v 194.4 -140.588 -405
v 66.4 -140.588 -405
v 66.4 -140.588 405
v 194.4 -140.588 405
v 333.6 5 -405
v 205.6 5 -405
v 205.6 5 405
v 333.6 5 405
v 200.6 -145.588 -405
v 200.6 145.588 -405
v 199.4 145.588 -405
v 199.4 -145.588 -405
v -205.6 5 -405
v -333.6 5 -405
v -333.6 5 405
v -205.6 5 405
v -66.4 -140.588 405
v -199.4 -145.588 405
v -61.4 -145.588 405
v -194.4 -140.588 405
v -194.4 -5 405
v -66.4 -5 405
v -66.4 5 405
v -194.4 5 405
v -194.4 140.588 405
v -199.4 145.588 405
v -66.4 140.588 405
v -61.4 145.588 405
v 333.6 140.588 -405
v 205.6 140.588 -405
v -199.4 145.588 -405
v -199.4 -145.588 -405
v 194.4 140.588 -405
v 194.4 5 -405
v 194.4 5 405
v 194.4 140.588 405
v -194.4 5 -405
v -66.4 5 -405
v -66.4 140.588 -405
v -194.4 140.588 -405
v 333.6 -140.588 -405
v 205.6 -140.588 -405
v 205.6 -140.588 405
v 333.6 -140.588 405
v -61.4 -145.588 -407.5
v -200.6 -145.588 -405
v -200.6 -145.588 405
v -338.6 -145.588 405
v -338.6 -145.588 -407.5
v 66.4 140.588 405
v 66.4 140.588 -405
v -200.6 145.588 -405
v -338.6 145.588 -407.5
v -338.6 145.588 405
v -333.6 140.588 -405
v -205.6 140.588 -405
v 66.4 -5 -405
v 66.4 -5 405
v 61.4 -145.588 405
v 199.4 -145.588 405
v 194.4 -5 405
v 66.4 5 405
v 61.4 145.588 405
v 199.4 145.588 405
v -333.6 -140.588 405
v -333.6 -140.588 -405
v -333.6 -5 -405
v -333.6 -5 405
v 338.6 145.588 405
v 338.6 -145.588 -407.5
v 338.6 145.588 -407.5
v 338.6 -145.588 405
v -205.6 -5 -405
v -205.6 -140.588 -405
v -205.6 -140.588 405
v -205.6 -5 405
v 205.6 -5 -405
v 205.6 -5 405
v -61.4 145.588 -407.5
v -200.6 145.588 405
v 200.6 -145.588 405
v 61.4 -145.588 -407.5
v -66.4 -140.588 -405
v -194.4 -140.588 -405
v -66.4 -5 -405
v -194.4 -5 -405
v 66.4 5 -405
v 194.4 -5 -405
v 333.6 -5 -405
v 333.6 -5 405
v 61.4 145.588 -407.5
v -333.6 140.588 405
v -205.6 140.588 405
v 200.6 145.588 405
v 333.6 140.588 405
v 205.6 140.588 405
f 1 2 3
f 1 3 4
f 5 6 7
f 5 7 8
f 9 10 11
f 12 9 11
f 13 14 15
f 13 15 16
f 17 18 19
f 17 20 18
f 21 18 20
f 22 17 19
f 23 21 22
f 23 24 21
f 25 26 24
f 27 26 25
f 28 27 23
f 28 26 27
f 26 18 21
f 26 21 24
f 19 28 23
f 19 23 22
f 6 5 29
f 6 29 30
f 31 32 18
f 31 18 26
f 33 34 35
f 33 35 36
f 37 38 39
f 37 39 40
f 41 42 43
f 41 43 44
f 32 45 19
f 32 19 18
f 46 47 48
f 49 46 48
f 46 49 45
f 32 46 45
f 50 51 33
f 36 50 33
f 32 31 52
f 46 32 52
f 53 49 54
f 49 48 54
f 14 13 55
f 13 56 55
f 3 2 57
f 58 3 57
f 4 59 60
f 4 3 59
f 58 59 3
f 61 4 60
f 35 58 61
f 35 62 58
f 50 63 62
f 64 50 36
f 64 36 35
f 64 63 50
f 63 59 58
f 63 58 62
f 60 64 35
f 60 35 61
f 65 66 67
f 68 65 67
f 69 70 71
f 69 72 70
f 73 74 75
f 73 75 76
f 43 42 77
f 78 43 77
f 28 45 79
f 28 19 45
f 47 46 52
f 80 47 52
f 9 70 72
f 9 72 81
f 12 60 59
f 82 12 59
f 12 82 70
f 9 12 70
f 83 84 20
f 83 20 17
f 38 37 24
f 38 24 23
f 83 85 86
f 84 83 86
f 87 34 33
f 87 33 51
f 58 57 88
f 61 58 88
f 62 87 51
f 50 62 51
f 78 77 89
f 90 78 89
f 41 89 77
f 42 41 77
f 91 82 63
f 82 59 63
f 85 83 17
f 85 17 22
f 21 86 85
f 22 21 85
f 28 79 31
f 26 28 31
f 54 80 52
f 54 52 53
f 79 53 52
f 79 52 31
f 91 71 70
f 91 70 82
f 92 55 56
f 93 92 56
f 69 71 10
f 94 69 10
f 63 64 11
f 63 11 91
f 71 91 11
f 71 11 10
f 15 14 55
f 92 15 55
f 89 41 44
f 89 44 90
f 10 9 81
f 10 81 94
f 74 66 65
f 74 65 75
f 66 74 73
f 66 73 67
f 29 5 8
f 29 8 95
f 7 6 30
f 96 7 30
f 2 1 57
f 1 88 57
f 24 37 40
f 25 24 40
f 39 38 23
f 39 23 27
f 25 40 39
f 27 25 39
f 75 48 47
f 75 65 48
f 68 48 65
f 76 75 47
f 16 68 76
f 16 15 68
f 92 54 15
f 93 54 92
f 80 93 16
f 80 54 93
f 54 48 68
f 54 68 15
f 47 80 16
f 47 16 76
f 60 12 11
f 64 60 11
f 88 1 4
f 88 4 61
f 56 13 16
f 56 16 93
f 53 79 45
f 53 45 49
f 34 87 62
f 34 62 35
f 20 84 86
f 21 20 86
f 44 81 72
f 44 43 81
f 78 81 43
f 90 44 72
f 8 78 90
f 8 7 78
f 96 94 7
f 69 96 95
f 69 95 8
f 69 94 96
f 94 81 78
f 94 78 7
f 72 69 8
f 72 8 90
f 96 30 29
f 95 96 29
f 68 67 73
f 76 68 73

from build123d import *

# Parameters (mm, degrees)
SKETCH1_W             = 138
SKETCH1_H             = 291.176
SKETCH1_W_2           = 128
SKETCH1_H_2           = 135.588
BOSS_EXTRUDE1_DEPTH   = 405
BOSS_EXTRUDE1_2_DEPTH = 405
BOSS_EXTRUDE1_3_DEPTH = 405
BOSS_EXTRUDE1_4_DEPTH = 405
SKETCH2_W             = 277.2
SKETCH2_H             = 291.176
BOSS_EXTRUDE2_DEPTH   = 2.5


with BuildPart() as part:
    # Sketch1 → Boss-Extrude1 (new, symmetric)
    with BuildSketch(Plane.XY):
        with Locations((130.4, 0)):
            Rectangle(SKETCH1_W, SKETCH1_H)
        with Locations((130.4, 72.794)):
            Rectangle(SKETCH1_W_2, SKETCH1_H_2, mode=Mode.SUBTRACT)
        with Locations((130.4, -72.794)):
            Rectangle(SKETCH1_W_2, SKETCH1_H_2, mode=Mode.SUBTRACT)
    extrude(amount=BOSS_EXTRUDE1_DEPTH, both=True)



with BuildPart() as body_2:
    # Sketch1 → Boss-Extrude1 2 (new, symmetric)
    with BuildSketch(Plane.XY):
        with Locations((269.6, 0)):
            Rectangle(SKETCH1_W, SKETCH1_H)
        with Locations((269.6, -72.794)):
            Rectangle(SKETCH1_W_2, SKETCH1_H_2, mode=Mode.SUBTRACT)
        with Locations((269.6, 72.794)):
            Rectangle(SKETCH1_W_2, SKETCH1_H_2, mode=Mode.SUBTRACT)
    extrude(amount=BOSS_EXTRUDE1_2_DEPTH, both=True)


with BuildPart() as body_3:
    # Sketch1 → Boss-Extrude1 3 (new, symmetric)
    with BuildSketch(Plane.XY):
        with Locations((-269.6, 0)):
            Rectangle(SKETCH1_W, SKETCH1_H)
        with Locations((-269.6, -72.794)):
            Rectangle(SKETCH1_W_2, SKETCH1_H_2, mode=Mode.SUBTRACT)
        with Locations((-269.6, 72.794)):
            Rectangle(SKETCH1_W_2, SKETCH1_H_2, mode=Mode.SUBTRACT)
    extrude(amount=BOSS_EXTRUDE1_3_DEPTH, both=True)


with BuildPart() as body_4:
    # Sketch1 → Boss-Extrude1 4 (new, symmetric)
    with BuildSketch(Plane.XY):
        with Locations((-130.4, 0)):
            Rectangle(SKETCH1_W, SKETCH1_H)
        with Locations((-130.4, -72.794)):
            Rectangle(SKETCH1_W_2, SKETCH1_H_2, mode=Mode.SUBTRACT)
        with Locations((-130.4, 72.794)):
            Rectangle(SKETCH1_W_2, SKETCH1_H_2, mode=Mode.SUBTRACT)
    extrude(amount=BOSS_EXTRUDE1_4_DEPTH, both=True)


with BuildPart() as part_1:
    add(part.part)

    add(body_2.part)  # Boss-Extrude2 merges body 2

    add(body_3.part)  # Boss-Extrude2 merges body 3

    add(body_4.part)  # Boss-Extrude2 merges body 4
    # Sketch2 → Boss-Extrude2 (add)
    with BuildSketch(Plane(origin=(0, 0, -405), x_dir=(-1, 0, 0), z_dir=(0, 0, -1))):
        with Locations((-200, 0)):
            Rectangle(SKETCH2_W, SKETCH2_H)
        with Locations((200, 0)):
            Rectangle(SKETCH2_W, SKETCH2_H)
    extrude(amount=BOSS_EXTRUDE2_DEPTH)


solid = part_1.part
